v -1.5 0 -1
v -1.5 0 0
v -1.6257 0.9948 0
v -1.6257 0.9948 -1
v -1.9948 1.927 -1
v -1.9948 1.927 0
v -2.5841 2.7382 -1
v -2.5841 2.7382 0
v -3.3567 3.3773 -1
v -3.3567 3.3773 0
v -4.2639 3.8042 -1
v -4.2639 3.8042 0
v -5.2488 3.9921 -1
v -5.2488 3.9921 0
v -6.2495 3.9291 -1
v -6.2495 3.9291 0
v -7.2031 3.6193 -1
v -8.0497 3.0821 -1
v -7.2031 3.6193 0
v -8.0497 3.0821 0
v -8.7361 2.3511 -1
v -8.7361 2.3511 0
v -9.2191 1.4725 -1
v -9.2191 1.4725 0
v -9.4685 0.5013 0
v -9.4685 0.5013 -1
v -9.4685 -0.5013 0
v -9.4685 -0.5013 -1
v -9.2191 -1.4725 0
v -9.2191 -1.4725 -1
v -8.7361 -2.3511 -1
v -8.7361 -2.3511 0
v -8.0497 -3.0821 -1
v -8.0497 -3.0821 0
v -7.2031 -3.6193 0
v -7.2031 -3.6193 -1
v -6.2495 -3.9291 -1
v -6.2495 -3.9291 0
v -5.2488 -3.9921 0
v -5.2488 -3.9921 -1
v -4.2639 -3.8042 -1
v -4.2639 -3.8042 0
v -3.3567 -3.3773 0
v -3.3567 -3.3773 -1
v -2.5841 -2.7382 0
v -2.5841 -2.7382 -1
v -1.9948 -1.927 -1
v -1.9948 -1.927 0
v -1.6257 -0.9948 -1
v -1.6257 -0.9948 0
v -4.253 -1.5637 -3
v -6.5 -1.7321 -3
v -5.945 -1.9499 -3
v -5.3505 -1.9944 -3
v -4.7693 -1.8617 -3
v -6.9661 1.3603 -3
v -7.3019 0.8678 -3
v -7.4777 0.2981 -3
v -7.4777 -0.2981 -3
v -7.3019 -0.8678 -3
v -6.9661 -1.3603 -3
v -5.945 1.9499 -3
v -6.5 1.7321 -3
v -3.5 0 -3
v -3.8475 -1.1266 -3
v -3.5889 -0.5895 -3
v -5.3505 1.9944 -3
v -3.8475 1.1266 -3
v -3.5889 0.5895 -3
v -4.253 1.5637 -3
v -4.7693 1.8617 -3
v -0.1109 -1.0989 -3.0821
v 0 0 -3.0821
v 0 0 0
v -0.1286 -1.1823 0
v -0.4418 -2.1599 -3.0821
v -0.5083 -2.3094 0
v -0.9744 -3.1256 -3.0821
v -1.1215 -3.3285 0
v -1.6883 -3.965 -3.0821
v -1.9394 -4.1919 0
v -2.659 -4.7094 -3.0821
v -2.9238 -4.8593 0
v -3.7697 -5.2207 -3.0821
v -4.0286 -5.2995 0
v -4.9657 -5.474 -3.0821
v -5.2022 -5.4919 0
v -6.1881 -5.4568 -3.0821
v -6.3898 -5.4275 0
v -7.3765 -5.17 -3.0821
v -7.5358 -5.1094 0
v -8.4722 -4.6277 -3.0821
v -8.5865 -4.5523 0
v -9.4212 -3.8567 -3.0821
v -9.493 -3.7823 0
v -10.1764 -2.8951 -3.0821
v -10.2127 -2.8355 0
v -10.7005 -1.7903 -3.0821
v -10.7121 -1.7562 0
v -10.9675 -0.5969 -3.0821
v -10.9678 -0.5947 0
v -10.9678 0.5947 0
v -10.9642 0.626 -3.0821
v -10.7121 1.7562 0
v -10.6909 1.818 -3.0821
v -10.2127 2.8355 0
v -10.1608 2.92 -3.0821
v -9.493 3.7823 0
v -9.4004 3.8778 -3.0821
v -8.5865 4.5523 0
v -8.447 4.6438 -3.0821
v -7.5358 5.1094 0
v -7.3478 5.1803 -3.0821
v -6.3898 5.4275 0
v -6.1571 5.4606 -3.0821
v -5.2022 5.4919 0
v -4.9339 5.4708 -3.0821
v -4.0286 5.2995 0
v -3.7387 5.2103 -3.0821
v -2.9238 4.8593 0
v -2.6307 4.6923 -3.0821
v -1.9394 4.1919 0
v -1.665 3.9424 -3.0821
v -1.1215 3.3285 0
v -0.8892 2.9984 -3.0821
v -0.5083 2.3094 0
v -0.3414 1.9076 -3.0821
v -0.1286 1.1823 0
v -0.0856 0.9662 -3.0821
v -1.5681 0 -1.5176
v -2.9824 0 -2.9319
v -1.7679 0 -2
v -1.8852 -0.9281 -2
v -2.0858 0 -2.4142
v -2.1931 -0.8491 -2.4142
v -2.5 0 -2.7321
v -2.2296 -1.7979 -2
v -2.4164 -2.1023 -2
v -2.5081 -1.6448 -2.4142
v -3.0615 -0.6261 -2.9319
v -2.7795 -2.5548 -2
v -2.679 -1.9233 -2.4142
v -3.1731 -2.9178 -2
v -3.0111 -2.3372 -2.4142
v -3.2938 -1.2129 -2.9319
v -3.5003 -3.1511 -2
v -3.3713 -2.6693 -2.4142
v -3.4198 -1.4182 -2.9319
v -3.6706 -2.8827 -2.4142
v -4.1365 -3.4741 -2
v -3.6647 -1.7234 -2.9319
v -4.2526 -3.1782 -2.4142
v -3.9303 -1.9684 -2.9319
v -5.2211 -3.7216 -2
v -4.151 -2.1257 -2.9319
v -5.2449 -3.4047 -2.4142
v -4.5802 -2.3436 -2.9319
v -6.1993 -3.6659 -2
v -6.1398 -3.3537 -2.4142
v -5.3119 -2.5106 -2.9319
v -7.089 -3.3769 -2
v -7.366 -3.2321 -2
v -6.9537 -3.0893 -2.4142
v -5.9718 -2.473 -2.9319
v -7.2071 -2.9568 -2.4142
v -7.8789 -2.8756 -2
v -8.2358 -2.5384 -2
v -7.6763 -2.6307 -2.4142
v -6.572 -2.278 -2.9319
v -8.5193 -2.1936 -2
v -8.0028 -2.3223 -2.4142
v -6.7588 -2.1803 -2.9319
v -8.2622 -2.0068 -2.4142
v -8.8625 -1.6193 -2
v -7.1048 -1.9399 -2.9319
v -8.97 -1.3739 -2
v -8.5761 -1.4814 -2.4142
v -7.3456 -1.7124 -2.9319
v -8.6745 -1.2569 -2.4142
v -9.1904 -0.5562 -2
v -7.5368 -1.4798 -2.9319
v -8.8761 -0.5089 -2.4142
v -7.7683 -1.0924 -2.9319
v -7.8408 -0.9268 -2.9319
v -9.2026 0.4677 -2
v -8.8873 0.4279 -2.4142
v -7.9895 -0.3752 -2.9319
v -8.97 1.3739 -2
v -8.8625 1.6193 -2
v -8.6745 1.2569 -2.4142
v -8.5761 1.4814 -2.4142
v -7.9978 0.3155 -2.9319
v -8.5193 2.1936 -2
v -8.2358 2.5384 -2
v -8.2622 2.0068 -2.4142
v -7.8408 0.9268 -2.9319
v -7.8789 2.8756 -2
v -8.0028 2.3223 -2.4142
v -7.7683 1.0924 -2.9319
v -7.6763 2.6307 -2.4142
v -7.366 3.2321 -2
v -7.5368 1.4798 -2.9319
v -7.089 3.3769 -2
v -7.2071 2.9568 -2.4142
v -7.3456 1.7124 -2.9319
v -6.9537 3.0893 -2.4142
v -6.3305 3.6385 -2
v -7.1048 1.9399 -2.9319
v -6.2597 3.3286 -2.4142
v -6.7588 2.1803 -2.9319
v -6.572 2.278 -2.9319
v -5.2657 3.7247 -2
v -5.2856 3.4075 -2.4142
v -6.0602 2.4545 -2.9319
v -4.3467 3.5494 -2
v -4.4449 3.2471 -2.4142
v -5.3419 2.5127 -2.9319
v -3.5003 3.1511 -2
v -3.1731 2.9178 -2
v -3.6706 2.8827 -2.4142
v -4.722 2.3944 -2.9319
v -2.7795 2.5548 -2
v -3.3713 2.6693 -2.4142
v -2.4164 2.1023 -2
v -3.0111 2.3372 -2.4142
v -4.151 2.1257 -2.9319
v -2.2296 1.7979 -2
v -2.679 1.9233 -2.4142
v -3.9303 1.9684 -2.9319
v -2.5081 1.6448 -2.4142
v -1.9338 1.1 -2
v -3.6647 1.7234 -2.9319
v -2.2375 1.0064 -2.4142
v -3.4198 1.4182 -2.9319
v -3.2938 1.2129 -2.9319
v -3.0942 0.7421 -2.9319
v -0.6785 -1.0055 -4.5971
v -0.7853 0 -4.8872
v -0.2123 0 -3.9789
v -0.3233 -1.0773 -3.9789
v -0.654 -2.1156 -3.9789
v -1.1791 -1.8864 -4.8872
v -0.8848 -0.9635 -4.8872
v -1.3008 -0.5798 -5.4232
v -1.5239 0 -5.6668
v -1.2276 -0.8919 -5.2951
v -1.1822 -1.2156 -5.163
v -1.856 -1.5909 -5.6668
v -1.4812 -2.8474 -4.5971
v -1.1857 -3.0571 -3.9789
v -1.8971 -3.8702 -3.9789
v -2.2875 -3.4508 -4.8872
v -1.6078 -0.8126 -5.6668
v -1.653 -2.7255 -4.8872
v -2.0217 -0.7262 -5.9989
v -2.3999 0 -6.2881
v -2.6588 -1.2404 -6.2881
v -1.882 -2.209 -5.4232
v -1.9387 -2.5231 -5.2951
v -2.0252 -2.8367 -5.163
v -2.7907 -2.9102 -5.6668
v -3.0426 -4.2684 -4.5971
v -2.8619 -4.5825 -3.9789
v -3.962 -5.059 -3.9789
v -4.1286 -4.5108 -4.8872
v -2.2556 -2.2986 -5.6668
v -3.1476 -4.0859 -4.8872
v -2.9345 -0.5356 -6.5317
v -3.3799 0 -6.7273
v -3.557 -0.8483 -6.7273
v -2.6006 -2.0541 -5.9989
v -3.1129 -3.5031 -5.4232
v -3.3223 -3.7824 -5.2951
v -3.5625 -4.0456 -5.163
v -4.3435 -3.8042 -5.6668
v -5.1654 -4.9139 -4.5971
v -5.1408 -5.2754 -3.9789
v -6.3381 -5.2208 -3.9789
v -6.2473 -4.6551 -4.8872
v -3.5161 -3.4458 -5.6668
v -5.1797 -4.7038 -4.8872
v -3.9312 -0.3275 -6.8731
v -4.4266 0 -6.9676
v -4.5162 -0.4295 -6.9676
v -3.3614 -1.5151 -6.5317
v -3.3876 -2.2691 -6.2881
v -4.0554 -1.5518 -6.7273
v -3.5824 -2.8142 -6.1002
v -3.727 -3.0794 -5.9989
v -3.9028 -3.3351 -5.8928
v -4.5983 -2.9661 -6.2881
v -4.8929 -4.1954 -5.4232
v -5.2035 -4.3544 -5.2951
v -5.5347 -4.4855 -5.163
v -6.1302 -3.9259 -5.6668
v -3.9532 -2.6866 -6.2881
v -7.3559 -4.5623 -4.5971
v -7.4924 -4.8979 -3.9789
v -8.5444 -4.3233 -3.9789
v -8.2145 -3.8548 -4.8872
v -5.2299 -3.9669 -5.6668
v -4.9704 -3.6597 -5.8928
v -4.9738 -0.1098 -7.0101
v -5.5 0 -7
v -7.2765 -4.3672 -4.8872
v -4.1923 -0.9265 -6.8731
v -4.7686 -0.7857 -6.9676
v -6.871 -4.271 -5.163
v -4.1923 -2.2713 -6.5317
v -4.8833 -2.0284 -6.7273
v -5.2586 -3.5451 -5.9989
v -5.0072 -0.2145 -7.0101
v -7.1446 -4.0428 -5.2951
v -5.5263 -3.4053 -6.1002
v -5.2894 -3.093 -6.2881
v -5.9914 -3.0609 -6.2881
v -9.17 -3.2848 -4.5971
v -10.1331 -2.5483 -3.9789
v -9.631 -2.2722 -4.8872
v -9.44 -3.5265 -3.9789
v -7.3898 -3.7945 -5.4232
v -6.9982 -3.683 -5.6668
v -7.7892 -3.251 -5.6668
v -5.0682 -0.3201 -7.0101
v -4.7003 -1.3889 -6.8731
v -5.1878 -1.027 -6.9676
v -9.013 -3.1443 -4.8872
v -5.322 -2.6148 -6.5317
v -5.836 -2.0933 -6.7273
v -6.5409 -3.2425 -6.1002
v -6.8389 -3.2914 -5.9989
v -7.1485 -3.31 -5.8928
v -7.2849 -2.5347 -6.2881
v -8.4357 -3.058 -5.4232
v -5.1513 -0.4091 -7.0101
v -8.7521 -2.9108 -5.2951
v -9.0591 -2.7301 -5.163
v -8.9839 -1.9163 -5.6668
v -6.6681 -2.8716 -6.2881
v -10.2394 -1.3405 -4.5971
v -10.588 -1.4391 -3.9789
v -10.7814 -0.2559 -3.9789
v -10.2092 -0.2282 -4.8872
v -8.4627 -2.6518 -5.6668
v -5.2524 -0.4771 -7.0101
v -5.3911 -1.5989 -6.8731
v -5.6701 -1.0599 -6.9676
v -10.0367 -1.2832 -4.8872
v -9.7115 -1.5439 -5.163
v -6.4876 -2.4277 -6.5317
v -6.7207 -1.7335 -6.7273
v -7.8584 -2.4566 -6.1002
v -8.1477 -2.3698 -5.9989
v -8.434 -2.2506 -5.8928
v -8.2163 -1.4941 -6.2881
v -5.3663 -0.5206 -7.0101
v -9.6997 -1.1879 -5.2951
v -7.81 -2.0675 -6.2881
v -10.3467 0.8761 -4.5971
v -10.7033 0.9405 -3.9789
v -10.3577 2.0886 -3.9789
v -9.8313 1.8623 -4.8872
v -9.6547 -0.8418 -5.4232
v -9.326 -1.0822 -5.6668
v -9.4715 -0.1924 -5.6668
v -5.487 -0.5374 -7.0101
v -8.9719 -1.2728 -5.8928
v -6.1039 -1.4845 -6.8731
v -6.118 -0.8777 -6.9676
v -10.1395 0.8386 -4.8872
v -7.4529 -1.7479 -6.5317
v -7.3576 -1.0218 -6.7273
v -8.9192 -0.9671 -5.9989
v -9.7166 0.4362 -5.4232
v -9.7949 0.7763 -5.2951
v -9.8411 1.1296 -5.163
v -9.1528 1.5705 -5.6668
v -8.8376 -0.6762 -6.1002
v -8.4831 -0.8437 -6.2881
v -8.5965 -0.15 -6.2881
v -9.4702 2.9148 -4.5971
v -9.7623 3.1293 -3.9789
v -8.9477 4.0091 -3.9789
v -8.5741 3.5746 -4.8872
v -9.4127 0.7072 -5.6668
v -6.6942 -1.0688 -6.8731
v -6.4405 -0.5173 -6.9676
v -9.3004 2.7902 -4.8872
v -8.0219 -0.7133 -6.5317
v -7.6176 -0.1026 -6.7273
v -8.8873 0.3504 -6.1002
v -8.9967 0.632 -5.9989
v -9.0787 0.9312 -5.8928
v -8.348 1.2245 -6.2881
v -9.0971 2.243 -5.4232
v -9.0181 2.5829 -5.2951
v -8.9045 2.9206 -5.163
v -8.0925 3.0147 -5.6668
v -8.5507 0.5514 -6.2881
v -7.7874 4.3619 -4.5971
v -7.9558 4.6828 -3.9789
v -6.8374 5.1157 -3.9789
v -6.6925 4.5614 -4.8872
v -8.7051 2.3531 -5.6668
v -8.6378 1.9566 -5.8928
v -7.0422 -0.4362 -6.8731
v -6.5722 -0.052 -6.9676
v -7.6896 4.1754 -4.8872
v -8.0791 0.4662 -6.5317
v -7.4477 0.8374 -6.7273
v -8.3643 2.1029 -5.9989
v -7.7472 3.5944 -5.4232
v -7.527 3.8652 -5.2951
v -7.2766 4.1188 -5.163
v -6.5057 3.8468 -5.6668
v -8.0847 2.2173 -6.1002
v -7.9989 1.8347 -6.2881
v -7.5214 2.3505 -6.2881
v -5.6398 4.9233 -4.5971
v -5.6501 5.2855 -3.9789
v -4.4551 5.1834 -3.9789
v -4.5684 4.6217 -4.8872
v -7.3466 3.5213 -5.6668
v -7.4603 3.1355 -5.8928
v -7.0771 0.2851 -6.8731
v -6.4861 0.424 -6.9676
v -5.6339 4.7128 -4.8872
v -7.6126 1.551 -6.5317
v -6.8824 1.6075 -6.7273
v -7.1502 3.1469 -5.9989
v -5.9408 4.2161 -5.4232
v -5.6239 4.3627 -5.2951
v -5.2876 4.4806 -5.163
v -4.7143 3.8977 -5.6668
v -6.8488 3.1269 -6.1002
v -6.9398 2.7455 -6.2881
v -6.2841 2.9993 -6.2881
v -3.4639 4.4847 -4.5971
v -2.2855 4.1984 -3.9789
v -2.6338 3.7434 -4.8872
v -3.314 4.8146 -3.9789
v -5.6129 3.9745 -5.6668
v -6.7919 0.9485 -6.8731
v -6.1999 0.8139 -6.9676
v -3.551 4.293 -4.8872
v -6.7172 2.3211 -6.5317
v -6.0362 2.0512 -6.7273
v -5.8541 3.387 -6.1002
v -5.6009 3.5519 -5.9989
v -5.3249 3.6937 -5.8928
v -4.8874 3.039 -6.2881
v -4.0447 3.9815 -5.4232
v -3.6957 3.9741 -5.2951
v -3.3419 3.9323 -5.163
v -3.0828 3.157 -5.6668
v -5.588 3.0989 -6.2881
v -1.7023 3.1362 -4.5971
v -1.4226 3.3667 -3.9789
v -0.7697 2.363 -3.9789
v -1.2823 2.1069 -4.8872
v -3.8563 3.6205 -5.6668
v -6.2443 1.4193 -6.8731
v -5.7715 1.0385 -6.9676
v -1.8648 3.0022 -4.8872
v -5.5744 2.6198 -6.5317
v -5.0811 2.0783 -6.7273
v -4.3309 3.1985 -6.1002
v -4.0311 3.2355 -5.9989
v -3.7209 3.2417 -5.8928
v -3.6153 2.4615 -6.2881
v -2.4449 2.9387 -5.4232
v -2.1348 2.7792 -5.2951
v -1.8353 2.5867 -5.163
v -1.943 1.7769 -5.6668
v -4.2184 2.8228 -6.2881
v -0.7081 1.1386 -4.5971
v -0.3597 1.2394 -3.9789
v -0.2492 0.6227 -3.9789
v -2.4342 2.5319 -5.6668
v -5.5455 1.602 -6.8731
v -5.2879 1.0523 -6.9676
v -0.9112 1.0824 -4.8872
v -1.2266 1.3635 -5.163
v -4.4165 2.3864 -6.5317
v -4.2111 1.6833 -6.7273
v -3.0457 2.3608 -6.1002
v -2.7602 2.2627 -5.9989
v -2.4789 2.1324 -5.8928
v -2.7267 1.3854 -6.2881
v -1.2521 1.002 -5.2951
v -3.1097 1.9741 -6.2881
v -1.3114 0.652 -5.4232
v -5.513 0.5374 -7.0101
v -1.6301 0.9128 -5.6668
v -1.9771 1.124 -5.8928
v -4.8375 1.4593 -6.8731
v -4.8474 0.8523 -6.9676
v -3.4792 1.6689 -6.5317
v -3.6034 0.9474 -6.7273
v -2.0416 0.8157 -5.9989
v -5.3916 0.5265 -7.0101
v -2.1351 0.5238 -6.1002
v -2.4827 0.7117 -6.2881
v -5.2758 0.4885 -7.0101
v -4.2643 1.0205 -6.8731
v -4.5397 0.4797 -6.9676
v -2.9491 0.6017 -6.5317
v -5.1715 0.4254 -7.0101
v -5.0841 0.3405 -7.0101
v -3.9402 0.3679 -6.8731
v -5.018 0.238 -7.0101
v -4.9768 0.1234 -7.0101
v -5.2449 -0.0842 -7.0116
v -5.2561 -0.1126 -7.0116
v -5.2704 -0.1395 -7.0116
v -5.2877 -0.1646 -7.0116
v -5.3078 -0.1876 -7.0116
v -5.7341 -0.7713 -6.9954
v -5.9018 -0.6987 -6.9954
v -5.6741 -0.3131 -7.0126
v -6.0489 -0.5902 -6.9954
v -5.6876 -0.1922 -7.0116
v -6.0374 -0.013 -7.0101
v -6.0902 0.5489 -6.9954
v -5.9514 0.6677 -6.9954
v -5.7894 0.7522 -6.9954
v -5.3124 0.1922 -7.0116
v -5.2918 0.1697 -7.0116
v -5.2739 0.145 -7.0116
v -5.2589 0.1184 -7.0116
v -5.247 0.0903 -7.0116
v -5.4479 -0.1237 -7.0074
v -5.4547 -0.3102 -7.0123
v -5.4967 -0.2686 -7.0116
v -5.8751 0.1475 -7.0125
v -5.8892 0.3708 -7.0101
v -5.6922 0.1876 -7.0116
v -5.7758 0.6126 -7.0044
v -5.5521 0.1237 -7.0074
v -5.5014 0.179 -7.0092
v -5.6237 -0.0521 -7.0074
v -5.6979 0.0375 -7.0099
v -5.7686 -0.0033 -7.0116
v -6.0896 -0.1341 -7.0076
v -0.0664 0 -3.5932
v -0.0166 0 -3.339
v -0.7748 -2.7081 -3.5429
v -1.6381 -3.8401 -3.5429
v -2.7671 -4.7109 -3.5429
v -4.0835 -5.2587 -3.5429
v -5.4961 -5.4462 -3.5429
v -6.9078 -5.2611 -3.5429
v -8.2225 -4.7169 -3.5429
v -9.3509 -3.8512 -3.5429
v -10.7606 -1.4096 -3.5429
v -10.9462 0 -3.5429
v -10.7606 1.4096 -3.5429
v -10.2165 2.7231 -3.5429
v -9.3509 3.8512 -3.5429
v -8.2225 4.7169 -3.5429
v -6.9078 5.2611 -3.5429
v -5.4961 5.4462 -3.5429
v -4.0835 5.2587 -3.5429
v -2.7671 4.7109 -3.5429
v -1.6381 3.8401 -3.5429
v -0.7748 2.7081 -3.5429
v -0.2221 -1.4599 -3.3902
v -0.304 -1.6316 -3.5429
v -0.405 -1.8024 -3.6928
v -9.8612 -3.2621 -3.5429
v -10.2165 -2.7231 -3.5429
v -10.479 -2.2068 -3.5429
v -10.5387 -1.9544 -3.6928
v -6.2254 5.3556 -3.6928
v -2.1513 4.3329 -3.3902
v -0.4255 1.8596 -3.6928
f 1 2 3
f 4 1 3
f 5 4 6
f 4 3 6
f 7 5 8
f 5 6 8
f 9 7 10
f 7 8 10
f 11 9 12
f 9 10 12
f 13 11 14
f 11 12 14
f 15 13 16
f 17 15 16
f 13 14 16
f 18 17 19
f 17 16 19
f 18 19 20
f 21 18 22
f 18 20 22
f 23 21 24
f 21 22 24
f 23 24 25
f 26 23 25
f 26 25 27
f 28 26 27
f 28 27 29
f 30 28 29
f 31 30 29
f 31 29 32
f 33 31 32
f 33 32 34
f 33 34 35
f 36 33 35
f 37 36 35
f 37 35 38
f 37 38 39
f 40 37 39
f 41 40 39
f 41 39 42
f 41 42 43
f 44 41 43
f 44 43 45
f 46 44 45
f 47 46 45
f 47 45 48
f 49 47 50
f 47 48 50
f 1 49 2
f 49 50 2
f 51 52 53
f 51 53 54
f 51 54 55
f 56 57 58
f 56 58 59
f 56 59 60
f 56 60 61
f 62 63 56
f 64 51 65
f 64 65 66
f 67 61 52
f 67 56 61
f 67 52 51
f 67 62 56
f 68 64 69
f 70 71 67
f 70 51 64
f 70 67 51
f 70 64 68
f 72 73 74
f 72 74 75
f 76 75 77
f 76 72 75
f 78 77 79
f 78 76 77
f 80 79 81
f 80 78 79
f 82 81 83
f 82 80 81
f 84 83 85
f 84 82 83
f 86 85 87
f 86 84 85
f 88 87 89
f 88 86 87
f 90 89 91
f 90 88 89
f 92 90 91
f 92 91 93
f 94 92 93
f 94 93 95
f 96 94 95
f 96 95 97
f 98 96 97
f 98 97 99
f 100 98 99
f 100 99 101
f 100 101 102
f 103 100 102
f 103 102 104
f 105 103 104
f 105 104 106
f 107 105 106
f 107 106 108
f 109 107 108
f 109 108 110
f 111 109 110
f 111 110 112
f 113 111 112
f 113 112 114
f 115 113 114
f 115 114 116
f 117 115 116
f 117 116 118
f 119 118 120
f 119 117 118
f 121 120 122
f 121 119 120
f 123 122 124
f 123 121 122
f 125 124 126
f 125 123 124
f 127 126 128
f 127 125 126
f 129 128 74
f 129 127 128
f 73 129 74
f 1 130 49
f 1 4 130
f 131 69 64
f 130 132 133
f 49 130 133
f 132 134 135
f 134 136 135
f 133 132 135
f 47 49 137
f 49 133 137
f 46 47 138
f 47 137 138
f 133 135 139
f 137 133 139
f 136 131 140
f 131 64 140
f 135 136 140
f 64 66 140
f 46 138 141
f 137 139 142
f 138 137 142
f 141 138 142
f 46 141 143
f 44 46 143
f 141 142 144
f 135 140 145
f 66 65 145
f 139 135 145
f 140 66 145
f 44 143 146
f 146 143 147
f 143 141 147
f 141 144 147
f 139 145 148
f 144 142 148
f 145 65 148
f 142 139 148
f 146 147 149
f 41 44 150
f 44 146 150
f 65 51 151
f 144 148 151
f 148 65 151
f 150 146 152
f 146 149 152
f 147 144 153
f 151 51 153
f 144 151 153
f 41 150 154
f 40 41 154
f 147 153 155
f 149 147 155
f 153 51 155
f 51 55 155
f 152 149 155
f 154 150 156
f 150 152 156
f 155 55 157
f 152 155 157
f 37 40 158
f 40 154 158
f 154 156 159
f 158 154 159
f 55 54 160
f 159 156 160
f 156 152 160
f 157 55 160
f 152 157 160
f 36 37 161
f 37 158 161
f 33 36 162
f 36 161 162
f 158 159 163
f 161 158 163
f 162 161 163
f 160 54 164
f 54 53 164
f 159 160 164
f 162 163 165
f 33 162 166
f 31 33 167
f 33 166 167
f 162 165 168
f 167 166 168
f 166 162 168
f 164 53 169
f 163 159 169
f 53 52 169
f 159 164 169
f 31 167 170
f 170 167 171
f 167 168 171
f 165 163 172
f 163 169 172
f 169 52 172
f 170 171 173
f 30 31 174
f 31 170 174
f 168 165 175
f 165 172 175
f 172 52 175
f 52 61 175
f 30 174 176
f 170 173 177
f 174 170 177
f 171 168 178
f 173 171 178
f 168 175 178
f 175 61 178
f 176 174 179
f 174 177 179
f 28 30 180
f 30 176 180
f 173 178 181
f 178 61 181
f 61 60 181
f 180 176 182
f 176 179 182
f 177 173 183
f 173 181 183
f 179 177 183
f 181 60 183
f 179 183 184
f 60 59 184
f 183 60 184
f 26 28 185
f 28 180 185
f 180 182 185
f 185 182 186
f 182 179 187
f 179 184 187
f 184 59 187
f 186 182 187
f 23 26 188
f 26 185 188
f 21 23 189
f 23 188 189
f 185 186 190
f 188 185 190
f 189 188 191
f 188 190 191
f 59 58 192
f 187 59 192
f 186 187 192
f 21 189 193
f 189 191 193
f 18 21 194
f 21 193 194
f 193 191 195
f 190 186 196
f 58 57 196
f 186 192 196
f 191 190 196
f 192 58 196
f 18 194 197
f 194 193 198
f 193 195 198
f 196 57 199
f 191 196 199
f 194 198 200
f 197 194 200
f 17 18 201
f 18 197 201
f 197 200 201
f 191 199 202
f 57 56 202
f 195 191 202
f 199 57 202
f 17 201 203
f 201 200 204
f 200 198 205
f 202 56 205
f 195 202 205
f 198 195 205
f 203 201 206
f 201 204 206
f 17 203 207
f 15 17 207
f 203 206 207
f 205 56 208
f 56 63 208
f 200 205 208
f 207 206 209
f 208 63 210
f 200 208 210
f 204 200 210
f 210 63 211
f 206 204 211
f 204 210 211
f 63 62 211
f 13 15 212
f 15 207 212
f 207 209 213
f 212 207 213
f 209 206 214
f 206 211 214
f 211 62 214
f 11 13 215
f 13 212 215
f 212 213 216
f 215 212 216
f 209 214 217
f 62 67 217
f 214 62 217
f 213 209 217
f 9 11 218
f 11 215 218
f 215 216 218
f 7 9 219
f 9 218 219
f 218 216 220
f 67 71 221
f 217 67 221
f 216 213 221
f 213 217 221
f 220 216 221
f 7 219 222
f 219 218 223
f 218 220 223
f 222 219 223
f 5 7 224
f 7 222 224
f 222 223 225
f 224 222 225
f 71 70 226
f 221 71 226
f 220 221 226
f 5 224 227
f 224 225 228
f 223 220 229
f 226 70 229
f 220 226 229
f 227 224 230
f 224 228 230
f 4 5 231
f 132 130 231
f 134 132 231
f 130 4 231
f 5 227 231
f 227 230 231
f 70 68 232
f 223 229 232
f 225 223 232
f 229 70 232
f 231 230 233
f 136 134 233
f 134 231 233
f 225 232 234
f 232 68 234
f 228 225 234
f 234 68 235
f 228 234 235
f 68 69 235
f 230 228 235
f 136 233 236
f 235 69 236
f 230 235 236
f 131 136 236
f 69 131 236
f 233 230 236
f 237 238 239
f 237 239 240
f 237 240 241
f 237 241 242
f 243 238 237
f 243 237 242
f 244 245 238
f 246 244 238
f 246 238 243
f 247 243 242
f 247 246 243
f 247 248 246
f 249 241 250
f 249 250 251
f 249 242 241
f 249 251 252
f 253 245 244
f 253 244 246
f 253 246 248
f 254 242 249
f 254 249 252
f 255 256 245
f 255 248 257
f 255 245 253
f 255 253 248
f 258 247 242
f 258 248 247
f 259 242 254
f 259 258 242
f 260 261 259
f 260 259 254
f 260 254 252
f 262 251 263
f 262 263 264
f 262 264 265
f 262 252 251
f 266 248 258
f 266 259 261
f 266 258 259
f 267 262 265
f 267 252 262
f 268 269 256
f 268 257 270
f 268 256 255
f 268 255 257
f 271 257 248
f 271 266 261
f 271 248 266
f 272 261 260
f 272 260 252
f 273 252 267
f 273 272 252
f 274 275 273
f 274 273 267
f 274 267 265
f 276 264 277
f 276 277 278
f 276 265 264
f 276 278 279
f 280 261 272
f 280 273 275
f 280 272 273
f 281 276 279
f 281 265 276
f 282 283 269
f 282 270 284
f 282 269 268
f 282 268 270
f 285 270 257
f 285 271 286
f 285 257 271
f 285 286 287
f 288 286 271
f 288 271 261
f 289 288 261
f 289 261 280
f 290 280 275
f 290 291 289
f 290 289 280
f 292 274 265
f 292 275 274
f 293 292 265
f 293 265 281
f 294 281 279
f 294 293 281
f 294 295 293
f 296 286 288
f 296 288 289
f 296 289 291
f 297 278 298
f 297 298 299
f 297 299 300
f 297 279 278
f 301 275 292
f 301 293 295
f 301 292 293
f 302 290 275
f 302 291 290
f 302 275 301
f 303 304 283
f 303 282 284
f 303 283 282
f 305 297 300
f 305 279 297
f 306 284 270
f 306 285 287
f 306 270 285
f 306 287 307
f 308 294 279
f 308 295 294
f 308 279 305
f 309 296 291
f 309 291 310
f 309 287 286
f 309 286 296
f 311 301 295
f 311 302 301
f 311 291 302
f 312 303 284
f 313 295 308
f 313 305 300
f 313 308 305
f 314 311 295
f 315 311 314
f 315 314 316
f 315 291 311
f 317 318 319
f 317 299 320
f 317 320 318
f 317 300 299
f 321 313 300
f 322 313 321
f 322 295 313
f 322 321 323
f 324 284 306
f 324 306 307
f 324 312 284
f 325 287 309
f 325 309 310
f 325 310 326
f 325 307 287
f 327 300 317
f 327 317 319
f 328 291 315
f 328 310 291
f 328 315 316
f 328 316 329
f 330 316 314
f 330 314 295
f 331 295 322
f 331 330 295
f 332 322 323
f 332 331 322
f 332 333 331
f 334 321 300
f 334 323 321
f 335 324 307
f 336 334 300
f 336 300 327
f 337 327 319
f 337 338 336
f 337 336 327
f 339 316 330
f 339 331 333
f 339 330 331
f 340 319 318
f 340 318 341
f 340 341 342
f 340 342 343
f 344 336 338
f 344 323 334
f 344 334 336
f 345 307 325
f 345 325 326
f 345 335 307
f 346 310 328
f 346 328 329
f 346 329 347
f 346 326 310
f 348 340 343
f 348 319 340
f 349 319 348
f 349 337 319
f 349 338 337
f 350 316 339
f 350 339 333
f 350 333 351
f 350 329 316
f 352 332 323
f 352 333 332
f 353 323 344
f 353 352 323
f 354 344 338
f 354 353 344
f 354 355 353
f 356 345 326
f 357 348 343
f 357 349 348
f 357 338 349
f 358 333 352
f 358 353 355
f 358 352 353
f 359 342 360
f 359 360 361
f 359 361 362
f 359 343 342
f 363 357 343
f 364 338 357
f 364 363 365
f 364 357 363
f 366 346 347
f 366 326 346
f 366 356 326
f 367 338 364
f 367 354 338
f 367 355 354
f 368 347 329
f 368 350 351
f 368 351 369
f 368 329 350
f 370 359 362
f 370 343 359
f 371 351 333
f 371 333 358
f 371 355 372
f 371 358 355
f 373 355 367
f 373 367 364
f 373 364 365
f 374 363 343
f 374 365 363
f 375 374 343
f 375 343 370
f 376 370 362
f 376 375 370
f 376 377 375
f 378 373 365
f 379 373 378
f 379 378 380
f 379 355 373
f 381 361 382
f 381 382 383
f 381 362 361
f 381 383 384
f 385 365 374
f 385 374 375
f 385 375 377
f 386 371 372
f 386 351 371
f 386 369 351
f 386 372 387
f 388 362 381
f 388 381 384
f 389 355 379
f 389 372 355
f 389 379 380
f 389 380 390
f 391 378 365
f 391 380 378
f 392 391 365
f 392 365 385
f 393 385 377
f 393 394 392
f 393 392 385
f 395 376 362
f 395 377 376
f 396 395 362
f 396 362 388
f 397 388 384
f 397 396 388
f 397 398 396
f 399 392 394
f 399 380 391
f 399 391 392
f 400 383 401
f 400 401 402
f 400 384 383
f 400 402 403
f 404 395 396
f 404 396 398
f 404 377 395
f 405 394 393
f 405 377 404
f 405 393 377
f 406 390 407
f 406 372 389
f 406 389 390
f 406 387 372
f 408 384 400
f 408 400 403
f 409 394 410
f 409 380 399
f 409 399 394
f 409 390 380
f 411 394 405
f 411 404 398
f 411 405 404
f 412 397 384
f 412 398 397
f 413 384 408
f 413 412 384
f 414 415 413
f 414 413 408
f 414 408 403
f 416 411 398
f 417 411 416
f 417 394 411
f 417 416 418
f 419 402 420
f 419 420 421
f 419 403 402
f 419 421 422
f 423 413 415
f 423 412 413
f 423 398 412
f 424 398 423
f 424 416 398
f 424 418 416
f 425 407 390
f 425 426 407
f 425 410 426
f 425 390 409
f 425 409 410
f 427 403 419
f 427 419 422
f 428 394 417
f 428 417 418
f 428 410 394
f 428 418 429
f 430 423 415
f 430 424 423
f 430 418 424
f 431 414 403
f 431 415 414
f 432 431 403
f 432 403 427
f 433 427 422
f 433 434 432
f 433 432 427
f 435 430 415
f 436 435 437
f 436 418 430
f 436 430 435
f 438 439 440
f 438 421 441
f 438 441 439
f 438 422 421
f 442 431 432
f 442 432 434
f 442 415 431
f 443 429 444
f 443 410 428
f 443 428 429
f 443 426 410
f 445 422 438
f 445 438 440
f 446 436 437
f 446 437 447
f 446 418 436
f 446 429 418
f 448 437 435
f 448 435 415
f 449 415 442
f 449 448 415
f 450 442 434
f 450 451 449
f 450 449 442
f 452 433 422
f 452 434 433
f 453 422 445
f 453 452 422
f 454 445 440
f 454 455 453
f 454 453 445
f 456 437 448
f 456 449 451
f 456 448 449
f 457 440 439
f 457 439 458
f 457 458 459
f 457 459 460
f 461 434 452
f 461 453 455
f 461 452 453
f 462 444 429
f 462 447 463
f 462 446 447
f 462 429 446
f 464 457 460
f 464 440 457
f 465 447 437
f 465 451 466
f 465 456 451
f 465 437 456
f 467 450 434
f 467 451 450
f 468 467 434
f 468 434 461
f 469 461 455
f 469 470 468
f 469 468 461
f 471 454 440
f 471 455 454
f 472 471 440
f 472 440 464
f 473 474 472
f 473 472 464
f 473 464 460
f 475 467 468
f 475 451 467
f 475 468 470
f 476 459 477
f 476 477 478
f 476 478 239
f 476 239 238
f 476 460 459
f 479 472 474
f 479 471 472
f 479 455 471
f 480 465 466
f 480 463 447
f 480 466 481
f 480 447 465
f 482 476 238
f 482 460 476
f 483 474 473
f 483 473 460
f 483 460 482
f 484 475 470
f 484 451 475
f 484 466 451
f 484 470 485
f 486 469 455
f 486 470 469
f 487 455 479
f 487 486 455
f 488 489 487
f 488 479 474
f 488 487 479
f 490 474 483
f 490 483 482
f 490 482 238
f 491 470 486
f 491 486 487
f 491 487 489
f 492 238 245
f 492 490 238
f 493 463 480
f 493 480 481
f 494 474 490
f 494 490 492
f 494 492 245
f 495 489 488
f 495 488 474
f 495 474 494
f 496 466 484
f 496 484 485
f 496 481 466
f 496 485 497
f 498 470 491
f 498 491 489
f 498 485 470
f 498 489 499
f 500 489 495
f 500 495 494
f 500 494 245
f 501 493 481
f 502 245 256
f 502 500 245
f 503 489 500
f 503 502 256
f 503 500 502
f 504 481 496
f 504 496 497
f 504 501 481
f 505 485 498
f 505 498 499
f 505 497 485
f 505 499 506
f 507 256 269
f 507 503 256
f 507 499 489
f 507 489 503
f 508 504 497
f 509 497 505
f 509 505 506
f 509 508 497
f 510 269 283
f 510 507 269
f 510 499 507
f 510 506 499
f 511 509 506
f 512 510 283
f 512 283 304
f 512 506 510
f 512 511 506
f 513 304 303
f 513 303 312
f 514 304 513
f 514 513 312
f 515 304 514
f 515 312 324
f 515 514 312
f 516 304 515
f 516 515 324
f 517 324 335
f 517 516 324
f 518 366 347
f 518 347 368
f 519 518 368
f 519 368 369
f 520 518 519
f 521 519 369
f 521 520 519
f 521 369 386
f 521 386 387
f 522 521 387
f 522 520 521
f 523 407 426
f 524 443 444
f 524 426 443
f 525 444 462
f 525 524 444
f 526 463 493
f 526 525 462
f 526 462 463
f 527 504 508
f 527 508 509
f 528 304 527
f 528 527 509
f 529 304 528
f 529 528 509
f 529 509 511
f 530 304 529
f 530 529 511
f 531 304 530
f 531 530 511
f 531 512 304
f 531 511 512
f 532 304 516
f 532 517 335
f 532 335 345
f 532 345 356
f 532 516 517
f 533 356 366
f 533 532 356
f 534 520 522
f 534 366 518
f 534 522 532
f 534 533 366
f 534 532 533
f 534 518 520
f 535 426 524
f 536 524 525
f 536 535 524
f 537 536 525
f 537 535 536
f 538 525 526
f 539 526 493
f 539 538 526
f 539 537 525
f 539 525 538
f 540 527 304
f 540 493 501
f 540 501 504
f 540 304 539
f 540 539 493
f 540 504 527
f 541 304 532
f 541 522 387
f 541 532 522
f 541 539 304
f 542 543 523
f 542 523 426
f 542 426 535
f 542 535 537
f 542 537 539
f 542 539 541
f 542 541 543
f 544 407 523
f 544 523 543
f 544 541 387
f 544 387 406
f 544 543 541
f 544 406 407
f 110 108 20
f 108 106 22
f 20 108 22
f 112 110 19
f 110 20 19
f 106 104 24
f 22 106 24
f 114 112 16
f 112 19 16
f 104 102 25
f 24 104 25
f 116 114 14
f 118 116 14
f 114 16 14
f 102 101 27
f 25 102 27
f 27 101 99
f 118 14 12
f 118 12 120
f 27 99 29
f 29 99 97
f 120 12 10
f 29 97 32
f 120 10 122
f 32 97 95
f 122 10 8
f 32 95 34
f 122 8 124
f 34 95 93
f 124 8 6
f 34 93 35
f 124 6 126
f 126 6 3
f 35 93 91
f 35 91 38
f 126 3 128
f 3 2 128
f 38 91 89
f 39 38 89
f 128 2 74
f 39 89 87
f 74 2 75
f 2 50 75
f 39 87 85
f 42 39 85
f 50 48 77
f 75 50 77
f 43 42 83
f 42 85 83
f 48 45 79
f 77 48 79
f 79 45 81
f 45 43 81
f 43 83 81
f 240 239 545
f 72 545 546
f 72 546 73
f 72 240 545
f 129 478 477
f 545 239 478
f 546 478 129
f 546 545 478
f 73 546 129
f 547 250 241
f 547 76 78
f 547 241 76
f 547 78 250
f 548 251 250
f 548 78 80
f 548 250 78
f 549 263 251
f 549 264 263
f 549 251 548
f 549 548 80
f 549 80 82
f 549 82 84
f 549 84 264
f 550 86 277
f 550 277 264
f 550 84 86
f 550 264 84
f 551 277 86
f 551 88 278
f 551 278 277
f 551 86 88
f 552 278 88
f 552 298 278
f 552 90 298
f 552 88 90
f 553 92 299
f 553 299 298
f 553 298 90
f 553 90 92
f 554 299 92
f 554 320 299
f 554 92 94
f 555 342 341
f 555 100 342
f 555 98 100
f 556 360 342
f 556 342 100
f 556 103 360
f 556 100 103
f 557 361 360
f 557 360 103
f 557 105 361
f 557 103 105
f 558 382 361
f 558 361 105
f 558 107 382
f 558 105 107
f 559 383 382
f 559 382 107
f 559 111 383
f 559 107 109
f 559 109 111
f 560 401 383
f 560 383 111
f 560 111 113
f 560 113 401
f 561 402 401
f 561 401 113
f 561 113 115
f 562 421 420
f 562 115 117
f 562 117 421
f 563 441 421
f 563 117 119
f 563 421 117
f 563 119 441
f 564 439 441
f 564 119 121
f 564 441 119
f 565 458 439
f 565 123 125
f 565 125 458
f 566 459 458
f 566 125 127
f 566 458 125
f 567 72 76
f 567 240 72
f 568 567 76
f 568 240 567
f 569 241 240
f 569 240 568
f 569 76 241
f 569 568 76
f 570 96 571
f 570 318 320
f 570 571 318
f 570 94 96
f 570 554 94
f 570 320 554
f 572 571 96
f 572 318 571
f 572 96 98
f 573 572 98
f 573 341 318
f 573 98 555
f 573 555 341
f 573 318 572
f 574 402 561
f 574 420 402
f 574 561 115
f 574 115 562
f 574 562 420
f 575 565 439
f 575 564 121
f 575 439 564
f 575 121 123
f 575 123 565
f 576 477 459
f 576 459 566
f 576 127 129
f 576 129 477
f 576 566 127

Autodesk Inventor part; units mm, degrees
ref_plane "YZ Plane" through (0, 0, 0) normal (1, 0, 0) x (0, 1, 0)
ref_plane "XZ Plane" through (0, 0, 0) normal (0, 1, 0) x (-1, 0, 0)
ref_plane "XY Plane" through (0, 0, 0) normal (0, 0, 1) x (1, 0, 0)
sketch "Sketch1" plane through (0, 0, 0) normal (0, 1, 0) x (-1, 0, 0)
  line L0 (5.5, 0) -> (0, 0)
  line L1 (0, 0) -> (0, -3.5)
  line L2 (5.5, 0) -> (5.5, -7)
  arc A0 (0, -3.5) -> (5.5, -7) centre (5.1284, -1.5126) ccw
  dimension "d2" = 3.5
  dimension "d6" = 7
  dimension "d7" = 5.5
  dimension "d8" = 5.5
  dimension "d9" = 1.5126
revolve "Revolution1" add sketch "Sketch1" angle 360 about axis through (-5.5, 0, 0) along (0, 0, -1)
fillet "Fillet1" radius 2 1 edges at (-11, 0, -3.5)
sketch "Sketch2" plane through (-5.5, 0, 0) normal (0, 0, 1) x (1, 0, 0)
  point P0 (5.5, 0)
sketch "Sketch3" plane through (-5.5, 0, 0) normal (0, 0, 1) x (1, 0, 0)
  circle A0 centre (0, 0) radius 4
  circle A1 centre (0, 0) radius 5.5 projected
  point P0 (5.5, 0)
  dimension "d12" = 8
  dimension "d13" = 1.5
extrude "Extrusion1" cut sketch "Sketch3" against normal blind 3 contours A0
fillet "Fillet2" radius 2 1 edges at (-9.5, 0, -3)
properties part number "Part1 finger tip(middle)"
